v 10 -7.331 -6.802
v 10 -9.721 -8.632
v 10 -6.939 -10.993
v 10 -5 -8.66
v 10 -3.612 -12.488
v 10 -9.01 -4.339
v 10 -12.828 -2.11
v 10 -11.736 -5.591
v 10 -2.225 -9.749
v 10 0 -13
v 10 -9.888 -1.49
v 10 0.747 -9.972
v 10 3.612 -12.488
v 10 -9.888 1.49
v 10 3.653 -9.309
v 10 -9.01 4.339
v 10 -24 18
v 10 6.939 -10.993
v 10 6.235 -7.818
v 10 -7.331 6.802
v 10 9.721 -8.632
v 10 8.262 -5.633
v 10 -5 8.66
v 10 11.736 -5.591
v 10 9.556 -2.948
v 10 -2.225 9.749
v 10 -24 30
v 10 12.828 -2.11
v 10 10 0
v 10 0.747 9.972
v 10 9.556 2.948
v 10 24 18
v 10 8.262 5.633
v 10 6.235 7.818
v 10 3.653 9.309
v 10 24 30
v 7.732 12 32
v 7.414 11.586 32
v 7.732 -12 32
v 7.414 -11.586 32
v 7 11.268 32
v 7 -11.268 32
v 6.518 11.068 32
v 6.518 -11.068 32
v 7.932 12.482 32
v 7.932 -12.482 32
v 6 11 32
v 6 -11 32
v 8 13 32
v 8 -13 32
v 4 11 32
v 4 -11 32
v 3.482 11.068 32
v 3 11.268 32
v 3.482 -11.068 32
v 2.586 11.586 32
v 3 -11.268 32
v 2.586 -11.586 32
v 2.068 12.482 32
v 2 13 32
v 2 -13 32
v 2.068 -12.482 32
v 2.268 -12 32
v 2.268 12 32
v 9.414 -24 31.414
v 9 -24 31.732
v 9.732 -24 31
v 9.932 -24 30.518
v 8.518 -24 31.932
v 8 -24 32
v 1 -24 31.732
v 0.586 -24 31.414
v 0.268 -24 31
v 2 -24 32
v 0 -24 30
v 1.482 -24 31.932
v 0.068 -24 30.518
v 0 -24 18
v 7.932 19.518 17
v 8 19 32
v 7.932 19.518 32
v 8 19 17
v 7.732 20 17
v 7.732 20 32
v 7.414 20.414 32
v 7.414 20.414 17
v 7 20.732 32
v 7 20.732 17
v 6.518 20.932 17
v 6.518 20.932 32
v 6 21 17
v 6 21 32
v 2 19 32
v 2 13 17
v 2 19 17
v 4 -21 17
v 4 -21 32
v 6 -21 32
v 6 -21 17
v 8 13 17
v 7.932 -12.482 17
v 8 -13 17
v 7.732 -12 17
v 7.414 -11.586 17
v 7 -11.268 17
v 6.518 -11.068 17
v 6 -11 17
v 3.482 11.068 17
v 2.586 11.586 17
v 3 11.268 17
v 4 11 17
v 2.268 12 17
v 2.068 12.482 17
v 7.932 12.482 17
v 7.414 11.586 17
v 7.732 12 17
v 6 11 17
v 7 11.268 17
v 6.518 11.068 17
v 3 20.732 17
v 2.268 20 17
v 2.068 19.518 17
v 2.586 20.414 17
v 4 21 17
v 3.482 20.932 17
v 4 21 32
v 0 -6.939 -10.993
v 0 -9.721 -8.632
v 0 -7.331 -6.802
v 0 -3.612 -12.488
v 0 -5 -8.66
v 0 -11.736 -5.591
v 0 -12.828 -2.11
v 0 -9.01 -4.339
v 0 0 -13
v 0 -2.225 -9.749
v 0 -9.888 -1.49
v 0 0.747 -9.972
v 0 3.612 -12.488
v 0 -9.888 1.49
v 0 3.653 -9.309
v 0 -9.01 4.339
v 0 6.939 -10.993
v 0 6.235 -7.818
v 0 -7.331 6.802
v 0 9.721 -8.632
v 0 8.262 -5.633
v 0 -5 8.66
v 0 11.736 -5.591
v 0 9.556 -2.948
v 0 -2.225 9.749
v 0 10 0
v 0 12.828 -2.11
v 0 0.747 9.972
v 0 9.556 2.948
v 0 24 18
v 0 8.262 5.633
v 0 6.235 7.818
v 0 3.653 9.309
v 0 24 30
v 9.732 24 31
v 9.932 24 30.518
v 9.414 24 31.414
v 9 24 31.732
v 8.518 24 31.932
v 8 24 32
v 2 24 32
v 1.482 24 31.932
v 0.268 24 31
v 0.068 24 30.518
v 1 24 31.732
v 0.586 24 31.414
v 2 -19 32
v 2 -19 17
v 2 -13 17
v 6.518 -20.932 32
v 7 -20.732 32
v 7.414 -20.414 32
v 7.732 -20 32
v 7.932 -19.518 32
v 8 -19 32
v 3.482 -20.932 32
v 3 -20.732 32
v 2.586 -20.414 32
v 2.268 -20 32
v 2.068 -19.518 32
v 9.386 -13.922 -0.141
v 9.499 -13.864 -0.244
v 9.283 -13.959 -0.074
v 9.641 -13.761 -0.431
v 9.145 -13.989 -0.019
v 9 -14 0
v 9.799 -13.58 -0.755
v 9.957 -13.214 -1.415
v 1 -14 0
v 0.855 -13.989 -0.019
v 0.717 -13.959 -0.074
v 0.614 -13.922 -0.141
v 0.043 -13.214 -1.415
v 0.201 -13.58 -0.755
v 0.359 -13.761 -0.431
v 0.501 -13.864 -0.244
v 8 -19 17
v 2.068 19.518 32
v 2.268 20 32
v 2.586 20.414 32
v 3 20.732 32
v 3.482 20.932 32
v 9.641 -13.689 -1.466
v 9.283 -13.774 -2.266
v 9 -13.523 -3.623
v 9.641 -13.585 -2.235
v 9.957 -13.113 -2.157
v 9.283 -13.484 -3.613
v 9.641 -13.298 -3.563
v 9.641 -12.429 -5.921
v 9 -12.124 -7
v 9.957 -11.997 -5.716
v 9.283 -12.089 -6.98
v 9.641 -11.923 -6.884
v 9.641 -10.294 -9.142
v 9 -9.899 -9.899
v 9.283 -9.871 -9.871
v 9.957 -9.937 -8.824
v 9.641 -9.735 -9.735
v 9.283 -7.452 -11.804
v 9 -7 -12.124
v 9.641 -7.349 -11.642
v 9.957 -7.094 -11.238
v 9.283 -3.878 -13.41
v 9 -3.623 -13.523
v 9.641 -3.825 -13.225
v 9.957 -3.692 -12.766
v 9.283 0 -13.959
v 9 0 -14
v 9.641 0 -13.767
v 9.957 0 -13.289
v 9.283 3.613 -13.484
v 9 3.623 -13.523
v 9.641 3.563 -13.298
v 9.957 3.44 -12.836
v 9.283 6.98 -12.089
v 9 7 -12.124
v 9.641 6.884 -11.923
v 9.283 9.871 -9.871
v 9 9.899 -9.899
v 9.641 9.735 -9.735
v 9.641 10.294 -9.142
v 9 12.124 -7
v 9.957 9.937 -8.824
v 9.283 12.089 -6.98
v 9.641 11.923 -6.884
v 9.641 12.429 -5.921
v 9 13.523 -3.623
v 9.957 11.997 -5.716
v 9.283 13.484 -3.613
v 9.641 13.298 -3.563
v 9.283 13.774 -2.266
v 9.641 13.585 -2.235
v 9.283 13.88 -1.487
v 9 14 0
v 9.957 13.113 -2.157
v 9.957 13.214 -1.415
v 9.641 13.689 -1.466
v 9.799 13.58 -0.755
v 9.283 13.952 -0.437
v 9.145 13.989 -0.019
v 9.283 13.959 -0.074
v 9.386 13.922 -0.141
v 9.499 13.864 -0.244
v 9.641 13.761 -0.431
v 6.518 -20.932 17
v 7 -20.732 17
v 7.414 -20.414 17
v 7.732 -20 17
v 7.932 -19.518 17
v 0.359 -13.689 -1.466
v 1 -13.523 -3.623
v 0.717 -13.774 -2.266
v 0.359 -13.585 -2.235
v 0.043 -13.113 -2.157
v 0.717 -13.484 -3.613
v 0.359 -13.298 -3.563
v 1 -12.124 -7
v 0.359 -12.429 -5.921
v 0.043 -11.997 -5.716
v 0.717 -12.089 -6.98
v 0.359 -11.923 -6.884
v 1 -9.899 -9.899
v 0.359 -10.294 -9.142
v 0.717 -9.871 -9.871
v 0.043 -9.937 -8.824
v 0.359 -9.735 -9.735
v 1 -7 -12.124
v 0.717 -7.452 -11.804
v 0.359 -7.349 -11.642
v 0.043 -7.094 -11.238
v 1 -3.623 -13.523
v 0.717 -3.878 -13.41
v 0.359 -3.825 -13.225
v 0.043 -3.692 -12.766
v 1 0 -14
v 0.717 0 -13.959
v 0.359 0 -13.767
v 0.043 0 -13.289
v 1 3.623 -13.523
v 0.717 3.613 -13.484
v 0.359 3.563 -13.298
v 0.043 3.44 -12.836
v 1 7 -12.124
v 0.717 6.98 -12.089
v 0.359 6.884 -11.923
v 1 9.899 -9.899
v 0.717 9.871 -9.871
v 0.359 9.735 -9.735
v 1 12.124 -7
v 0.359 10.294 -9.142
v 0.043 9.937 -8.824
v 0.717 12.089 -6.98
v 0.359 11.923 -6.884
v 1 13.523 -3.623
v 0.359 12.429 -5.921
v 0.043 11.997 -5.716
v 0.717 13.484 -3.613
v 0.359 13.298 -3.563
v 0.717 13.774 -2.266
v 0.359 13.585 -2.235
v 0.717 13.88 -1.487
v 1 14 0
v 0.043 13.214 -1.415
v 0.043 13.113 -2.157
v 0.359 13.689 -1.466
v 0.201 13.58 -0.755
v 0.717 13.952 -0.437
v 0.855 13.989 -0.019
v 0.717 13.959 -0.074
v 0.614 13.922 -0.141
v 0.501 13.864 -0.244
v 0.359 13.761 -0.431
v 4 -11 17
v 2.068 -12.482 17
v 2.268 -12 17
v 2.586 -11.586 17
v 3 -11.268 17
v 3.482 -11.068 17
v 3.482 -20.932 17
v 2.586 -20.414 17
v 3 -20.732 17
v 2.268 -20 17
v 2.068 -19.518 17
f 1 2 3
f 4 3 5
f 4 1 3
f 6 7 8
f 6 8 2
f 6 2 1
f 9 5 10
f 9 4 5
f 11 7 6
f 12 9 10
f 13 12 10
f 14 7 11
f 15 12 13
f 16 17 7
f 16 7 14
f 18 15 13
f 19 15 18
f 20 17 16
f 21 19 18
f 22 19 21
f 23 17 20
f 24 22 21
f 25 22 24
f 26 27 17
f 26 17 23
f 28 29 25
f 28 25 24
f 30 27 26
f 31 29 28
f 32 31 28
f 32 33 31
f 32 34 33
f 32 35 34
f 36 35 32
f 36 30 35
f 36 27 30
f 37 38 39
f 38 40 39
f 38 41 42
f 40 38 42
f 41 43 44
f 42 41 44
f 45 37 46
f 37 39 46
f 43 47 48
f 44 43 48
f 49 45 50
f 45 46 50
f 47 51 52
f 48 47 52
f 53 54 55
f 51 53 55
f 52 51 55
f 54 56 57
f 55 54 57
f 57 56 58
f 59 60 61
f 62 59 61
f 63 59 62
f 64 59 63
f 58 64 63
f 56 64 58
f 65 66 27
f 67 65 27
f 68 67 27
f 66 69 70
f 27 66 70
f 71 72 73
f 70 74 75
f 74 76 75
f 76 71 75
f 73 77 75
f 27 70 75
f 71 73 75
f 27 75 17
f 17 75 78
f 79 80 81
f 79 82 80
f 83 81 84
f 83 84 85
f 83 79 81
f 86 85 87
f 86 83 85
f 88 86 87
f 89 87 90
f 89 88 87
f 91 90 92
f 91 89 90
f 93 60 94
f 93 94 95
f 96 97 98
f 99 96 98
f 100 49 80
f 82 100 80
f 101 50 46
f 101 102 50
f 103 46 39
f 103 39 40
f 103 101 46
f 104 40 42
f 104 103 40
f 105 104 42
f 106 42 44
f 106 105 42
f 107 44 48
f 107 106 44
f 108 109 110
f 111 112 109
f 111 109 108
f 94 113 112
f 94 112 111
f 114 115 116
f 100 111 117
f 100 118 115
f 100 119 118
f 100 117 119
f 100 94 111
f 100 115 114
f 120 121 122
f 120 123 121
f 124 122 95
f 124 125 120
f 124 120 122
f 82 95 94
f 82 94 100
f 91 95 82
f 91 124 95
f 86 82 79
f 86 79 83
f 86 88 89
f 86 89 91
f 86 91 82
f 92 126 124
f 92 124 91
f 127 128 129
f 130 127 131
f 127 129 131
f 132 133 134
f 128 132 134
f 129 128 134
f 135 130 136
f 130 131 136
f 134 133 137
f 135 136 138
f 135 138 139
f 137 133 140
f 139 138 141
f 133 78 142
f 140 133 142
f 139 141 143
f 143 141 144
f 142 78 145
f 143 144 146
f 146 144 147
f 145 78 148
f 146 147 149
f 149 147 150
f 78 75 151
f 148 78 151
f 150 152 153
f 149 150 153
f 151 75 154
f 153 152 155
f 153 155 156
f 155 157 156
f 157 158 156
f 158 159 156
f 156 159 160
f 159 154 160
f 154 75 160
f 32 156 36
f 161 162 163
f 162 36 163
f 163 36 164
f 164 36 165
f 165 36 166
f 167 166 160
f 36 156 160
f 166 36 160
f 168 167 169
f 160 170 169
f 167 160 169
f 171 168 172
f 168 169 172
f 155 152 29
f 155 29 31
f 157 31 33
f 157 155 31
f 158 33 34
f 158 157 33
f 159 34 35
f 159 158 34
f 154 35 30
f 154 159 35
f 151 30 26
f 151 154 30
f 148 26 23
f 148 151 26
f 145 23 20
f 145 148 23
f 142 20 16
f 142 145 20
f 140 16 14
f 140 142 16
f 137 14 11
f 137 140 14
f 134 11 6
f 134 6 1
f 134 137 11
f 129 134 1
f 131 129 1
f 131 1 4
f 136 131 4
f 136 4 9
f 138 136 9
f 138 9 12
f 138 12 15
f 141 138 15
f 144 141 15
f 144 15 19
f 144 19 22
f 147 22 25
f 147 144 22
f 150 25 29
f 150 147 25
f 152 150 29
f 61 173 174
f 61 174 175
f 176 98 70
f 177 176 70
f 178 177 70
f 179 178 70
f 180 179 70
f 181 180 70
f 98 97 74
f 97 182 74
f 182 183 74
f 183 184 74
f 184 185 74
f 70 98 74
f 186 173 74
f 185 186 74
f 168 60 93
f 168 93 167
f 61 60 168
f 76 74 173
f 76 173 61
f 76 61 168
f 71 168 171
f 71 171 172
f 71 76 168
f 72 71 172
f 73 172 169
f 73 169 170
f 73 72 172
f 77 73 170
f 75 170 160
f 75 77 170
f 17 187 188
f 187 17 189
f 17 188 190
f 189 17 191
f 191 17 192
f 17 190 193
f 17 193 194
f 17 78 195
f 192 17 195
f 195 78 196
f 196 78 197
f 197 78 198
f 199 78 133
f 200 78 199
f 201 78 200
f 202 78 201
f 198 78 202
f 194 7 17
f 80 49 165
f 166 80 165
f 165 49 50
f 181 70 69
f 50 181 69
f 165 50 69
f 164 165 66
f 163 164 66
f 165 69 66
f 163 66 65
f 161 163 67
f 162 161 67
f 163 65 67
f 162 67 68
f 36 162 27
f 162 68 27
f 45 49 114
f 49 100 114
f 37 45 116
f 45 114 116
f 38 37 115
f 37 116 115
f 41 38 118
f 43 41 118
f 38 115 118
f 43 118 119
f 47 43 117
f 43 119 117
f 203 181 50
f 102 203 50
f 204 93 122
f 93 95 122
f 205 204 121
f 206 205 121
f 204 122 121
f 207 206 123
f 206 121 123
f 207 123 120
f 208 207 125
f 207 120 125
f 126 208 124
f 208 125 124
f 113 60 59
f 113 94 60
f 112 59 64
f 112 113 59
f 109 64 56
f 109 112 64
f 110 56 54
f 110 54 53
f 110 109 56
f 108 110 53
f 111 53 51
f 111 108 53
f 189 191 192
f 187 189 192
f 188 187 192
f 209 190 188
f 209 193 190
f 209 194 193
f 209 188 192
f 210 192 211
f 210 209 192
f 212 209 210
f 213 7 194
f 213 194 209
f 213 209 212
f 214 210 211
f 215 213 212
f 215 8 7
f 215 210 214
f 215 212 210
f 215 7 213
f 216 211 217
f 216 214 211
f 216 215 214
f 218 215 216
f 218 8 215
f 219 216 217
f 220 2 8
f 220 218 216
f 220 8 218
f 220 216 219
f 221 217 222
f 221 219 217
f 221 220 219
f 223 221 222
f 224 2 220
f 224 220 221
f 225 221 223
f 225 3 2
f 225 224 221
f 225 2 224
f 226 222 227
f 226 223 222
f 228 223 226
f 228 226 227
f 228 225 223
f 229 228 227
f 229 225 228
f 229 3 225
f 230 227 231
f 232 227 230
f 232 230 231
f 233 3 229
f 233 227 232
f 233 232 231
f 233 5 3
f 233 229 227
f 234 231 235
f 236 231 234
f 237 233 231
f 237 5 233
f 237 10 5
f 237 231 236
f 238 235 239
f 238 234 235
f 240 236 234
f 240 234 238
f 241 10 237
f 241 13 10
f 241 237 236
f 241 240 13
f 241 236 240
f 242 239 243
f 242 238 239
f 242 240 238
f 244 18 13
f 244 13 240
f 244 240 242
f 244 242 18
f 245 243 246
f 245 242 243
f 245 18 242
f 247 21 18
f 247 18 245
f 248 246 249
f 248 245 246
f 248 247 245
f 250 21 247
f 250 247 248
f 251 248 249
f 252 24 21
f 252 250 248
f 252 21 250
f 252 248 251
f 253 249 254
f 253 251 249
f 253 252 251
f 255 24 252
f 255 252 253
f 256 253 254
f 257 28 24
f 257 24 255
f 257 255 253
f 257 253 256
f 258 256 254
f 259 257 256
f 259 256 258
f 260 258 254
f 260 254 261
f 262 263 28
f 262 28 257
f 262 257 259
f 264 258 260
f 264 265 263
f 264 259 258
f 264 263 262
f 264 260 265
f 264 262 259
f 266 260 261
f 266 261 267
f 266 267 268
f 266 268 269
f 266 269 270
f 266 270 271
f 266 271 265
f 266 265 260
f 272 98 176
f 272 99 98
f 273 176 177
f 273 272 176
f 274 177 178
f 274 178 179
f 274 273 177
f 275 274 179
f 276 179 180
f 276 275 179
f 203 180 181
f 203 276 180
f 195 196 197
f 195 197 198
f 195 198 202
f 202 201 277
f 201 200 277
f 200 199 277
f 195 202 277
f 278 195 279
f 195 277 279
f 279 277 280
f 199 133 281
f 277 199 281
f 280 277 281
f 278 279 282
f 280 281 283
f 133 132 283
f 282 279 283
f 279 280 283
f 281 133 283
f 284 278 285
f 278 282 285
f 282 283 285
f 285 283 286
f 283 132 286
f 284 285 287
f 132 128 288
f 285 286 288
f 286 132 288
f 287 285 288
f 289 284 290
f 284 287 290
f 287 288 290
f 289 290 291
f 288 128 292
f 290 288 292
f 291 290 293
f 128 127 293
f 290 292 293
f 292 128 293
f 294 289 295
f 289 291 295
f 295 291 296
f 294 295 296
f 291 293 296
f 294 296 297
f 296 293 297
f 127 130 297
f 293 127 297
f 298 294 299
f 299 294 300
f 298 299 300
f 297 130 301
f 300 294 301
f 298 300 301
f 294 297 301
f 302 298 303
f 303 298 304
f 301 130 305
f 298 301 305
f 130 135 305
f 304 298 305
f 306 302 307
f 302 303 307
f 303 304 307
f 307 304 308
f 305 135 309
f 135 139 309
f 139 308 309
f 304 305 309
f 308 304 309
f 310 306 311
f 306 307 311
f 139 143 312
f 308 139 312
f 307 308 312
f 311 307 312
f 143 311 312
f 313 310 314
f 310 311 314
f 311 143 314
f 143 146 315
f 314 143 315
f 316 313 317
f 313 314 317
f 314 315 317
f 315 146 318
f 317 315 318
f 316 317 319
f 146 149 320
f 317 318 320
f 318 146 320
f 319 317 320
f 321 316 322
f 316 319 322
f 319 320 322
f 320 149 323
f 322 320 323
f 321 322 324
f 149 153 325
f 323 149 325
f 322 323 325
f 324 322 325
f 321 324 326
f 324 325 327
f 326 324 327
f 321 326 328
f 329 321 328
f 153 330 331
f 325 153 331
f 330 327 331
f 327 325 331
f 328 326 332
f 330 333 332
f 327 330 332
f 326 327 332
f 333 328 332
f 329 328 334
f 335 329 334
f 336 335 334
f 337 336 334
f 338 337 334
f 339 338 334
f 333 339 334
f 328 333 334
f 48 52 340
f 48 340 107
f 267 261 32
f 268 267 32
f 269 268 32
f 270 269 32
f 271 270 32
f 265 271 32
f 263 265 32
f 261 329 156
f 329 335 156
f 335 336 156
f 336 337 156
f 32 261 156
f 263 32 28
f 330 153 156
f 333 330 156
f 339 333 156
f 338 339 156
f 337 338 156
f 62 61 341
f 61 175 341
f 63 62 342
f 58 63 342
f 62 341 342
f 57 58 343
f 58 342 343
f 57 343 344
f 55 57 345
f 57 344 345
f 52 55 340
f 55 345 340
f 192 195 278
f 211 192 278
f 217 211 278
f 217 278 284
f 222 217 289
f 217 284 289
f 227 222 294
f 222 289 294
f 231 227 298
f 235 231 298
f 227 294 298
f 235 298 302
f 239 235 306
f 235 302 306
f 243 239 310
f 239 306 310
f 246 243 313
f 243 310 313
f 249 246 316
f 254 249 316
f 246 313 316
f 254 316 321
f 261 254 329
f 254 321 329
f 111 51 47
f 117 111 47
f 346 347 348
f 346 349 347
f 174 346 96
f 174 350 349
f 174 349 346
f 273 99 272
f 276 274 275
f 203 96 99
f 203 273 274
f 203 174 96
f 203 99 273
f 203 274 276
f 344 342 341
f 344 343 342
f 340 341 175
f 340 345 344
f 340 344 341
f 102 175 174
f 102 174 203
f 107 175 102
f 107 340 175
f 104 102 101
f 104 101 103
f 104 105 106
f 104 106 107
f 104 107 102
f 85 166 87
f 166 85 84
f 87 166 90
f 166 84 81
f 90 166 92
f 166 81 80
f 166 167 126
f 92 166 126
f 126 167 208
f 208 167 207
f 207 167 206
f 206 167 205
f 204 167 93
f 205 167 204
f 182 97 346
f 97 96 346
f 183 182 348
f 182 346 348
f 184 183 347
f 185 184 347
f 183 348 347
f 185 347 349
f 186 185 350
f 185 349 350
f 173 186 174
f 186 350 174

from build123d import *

# Parameters (mm, degrees)
F0_R     = 10
F1_DEPTH = 10
F2_R     = 1
F3_R     = 2
F4_W     = 6
F4_H     = 10
F5_DEPTH = 15
F6_R     = 2


with BuildPart() as f1:
    # F0 (on Right) → F1 (new body)
    with BuildSketch(Plane.YZ):
        with BuildLine():
            Line((24, 32), (-24, 32))
            Line((-24, 32), (-24, 18))
            Line((-24, 18), (-14, 0))
            ThreePointArc((-14, 0), (0, -14), (14, 0))
            Line((14, 0), (24, 18))
            Line((24, 18), (24, 32))
        make_face()
        Circle(F0_R, mode=Mode.SUBTRACT)
    extrude(amount=F1_DEPTH)

    # F2
    f2_edges = [f1.edges().sort_by_distance(p)[0] for p in [
        (0, 0, -14),
        (10, 0, -14),
    ]]
    fillet(f2_edges, radius=F2_R)

    # F3
    f3_edges = [f1.edges().sort_by_distance(p)[0] for p in [
        (0, 0, 32),
        (10, 0, 32),
    ]]
    fillet(f3_edges, radius=F3_R)

    # F4 (on face) → F5 (cut)
    with BuildSketch(Plane.XY.offset(32)):
        with Locations((5, 16)):
            Rectangle(F4_W, F4_H)
        with Locations((5, -16)):
            Rectangle(F4_W, F4_H)
    extrude(amount=-F5_DEPTH, mode=Mode.SUBTRACT)

    # F6
    f6_edges = [f1.edges().sort_by_distance(p)[0] for p in [
        (2, 21, 24.5),
        (8, 21, 24.5),
        (8, 11, 24.5),
        (2, 11, 24.5),
        (2, -21, 24.5),
        (8, -21, 24.5),
        (8, -11, 24.5),
        (2, -11, 24.5),
    ]]
    fillet(f6_edges, radius=F6_R)


solid = f1.part
